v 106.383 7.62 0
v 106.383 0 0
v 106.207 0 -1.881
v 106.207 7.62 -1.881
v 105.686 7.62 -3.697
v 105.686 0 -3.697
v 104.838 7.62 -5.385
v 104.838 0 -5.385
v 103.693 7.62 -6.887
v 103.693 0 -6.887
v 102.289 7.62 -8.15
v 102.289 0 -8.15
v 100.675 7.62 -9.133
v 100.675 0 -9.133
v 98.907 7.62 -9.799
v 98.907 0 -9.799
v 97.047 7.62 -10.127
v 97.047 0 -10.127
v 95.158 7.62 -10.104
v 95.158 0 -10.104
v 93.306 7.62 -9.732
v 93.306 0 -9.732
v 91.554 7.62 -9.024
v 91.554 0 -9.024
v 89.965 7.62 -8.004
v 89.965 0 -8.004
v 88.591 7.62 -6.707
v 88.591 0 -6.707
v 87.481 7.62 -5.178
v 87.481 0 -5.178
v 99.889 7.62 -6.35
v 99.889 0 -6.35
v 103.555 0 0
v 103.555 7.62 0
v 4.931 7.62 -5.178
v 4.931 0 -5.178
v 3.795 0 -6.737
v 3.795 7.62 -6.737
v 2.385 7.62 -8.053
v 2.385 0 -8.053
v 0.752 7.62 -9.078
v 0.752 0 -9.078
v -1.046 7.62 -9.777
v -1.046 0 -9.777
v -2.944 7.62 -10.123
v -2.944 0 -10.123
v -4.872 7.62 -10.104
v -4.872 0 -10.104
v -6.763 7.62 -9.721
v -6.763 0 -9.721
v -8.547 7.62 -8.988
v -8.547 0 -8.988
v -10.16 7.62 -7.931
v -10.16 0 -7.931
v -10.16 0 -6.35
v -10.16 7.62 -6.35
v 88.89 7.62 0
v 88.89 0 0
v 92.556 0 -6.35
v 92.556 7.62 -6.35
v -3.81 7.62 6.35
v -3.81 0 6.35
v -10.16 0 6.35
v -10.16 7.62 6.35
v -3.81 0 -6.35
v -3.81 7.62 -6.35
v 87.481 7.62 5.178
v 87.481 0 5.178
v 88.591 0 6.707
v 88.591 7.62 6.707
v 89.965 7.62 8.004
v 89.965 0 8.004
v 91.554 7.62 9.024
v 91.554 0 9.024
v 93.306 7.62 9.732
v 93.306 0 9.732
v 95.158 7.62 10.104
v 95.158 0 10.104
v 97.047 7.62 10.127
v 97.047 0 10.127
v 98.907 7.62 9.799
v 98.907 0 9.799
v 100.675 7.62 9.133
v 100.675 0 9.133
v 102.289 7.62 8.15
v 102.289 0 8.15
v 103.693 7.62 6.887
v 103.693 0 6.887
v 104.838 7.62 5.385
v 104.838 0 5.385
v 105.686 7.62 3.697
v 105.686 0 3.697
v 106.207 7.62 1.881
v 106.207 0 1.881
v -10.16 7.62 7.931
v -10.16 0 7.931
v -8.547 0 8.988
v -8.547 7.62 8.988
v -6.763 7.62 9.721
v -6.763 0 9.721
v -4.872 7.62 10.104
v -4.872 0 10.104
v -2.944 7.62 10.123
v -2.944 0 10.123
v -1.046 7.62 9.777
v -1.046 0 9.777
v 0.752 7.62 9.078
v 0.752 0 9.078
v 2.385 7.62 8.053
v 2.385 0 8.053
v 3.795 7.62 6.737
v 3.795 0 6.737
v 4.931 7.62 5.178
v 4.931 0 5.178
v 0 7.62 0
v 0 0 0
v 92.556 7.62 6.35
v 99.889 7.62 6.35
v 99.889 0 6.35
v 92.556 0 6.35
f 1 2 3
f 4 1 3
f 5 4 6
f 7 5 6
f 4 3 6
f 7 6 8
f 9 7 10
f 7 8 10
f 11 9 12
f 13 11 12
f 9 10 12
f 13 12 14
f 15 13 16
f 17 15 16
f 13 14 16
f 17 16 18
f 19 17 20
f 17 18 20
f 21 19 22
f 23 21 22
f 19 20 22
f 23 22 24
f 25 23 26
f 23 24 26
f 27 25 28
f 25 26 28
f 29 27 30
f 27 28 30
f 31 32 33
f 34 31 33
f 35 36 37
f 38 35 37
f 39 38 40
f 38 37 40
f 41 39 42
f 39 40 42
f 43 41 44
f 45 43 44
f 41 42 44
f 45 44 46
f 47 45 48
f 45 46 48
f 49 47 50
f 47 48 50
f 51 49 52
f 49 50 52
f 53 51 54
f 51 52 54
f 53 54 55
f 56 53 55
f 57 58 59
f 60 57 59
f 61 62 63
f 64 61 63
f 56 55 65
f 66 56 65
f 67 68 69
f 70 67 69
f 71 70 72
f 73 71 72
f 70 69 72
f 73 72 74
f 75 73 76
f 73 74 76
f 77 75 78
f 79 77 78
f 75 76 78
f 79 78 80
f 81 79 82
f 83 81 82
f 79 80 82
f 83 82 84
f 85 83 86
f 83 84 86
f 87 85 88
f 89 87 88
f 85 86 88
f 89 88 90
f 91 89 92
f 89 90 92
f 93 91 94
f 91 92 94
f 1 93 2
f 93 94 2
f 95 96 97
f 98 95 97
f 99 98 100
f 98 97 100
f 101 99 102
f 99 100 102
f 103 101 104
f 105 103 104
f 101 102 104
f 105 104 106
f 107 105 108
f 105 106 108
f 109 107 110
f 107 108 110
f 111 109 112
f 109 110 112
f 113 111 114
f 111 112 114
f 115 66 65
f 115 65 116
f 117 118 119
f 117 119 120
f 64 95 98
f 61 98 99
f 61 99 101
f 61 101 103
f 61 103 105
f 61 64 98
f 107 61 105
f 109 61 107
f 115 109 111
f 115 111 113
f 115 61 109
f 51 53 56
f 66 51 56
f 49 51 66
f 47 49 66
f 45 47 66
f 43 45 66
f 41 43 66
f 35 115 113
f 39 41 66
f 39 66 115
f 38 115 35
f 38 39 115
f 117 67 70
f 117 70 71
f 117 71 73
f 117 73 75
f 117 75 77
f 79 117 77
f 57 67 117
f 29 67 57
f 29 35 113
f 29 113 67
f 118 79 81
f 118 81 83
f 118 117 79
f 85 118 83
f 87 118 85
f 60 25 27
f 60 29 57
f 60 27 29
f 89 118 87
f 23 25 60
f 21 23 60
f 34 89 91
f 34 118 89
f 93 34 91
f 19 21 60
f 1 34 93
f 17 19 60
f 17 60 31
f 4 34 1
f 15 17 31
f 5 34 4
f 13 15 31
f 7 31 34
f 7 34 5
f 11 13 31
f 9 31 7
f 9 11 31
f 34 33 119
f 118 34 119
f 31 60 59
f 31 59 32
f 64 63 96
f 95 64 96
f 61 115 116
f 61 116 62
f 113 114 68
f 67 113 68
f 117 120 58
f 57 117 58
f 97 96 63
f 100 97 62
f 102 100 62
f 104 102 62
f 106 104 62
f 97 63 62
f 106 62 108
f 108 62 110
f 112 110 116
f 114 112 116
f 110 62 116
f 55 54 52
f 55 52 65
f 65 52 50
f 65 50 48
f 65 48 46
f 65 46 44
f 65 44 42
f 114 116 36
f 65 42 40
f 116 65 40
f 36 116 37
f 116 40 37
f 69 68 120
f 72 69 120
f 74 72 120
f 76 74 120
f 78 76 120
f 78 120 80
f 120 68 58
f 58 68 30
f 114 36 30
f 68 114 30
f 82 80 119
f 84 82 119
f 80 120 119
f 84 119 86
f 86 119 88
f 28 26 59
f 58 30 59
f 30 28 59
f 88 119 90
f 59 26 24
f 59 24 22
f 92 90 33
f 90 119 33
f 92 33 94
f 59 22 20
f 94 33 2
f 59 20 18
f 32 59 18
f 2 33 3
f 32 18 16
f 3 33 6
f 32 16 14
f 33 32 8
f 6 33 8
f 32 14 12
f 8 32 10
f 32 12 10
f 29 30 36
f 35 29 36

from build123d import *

# Parameters (mm, degrees)
BOSS_EXTRUDE1_DEPTH = 7.62


with BuildPart() as part:
    # Sketch2 → Boss-Extrude1 (new body)
    with BuildSketch(Plane(origin=(0, 0, 0), x_dir=(1, 0, 0), z_dir=(0, 1, 0))):
        with BuildLine():
            ThreePointArc((87.481333576, -5.178289999), (98.907220268, -9.79891701), (106.382667152, 0))
            Line((106.382667152, 0), (103.555015571, 0))
            Line((103.555015571, 0), (101.721928466, -3.175))
            Line((101.721928466, -3.175), (99.888841361, -6.35))
            Line((99.888841361, -6.35), (92.556492943, -6.35))
            Line((92.556492943, -6.35), (90.723405838, -3.175))
            Line((90.723405838, -3.175), (88.890318733, 0))
            Line((88.890318733, 0), (0, 0))
            Line((0, 0), (-3.81, -6.35))
            Line((-3.81, -6.35), (-10.16, -6.35))
            Line((-10.16, -6.35), (-10.16, -7.931147458))
            ThreePointArc((-10.16, -7.931147458), (-1.986767948, -9.995070029), (4.931333576, -5.178289999))
            Line((4.931333576, -5.178289999), (87.481333576, -5.178289999))
        make_face()
        with BuildLine():
            Line((87.481333576, 5.178289999), (4.931333576, 5.178289999))
            ThreePointArc((4.931333576, 5.178289999), (-1.986767948, 9.995070029), (-10.16, 7.931147458))
            Line((-10.16, 7.931147458), (-10.16, 6.35))
            Line((-10.16, 6.35), (-3.81, 6.35))
            Line((-3.81, 6.35), (0, 0))
            Line((0, 0), (88.890318733, 0))
            Line((88.890318733, 0), (92.556492943, 6.35))
            Line((92.556492943, 6.35), (99.888841361, 6.35))
            Line((99.888841361, 6.35), (103.555015571, 0))
            Line((103.555015571, 0), (106.382667152, 0))
            ThreePointArc((106.382667152, 0), (98.907220268, 9.79891701), (87.481333576, 5.178289999))
        make_face()
    extrude(amount=BOSS_EXTRUDE1_DEPTH)


solid = part.part
